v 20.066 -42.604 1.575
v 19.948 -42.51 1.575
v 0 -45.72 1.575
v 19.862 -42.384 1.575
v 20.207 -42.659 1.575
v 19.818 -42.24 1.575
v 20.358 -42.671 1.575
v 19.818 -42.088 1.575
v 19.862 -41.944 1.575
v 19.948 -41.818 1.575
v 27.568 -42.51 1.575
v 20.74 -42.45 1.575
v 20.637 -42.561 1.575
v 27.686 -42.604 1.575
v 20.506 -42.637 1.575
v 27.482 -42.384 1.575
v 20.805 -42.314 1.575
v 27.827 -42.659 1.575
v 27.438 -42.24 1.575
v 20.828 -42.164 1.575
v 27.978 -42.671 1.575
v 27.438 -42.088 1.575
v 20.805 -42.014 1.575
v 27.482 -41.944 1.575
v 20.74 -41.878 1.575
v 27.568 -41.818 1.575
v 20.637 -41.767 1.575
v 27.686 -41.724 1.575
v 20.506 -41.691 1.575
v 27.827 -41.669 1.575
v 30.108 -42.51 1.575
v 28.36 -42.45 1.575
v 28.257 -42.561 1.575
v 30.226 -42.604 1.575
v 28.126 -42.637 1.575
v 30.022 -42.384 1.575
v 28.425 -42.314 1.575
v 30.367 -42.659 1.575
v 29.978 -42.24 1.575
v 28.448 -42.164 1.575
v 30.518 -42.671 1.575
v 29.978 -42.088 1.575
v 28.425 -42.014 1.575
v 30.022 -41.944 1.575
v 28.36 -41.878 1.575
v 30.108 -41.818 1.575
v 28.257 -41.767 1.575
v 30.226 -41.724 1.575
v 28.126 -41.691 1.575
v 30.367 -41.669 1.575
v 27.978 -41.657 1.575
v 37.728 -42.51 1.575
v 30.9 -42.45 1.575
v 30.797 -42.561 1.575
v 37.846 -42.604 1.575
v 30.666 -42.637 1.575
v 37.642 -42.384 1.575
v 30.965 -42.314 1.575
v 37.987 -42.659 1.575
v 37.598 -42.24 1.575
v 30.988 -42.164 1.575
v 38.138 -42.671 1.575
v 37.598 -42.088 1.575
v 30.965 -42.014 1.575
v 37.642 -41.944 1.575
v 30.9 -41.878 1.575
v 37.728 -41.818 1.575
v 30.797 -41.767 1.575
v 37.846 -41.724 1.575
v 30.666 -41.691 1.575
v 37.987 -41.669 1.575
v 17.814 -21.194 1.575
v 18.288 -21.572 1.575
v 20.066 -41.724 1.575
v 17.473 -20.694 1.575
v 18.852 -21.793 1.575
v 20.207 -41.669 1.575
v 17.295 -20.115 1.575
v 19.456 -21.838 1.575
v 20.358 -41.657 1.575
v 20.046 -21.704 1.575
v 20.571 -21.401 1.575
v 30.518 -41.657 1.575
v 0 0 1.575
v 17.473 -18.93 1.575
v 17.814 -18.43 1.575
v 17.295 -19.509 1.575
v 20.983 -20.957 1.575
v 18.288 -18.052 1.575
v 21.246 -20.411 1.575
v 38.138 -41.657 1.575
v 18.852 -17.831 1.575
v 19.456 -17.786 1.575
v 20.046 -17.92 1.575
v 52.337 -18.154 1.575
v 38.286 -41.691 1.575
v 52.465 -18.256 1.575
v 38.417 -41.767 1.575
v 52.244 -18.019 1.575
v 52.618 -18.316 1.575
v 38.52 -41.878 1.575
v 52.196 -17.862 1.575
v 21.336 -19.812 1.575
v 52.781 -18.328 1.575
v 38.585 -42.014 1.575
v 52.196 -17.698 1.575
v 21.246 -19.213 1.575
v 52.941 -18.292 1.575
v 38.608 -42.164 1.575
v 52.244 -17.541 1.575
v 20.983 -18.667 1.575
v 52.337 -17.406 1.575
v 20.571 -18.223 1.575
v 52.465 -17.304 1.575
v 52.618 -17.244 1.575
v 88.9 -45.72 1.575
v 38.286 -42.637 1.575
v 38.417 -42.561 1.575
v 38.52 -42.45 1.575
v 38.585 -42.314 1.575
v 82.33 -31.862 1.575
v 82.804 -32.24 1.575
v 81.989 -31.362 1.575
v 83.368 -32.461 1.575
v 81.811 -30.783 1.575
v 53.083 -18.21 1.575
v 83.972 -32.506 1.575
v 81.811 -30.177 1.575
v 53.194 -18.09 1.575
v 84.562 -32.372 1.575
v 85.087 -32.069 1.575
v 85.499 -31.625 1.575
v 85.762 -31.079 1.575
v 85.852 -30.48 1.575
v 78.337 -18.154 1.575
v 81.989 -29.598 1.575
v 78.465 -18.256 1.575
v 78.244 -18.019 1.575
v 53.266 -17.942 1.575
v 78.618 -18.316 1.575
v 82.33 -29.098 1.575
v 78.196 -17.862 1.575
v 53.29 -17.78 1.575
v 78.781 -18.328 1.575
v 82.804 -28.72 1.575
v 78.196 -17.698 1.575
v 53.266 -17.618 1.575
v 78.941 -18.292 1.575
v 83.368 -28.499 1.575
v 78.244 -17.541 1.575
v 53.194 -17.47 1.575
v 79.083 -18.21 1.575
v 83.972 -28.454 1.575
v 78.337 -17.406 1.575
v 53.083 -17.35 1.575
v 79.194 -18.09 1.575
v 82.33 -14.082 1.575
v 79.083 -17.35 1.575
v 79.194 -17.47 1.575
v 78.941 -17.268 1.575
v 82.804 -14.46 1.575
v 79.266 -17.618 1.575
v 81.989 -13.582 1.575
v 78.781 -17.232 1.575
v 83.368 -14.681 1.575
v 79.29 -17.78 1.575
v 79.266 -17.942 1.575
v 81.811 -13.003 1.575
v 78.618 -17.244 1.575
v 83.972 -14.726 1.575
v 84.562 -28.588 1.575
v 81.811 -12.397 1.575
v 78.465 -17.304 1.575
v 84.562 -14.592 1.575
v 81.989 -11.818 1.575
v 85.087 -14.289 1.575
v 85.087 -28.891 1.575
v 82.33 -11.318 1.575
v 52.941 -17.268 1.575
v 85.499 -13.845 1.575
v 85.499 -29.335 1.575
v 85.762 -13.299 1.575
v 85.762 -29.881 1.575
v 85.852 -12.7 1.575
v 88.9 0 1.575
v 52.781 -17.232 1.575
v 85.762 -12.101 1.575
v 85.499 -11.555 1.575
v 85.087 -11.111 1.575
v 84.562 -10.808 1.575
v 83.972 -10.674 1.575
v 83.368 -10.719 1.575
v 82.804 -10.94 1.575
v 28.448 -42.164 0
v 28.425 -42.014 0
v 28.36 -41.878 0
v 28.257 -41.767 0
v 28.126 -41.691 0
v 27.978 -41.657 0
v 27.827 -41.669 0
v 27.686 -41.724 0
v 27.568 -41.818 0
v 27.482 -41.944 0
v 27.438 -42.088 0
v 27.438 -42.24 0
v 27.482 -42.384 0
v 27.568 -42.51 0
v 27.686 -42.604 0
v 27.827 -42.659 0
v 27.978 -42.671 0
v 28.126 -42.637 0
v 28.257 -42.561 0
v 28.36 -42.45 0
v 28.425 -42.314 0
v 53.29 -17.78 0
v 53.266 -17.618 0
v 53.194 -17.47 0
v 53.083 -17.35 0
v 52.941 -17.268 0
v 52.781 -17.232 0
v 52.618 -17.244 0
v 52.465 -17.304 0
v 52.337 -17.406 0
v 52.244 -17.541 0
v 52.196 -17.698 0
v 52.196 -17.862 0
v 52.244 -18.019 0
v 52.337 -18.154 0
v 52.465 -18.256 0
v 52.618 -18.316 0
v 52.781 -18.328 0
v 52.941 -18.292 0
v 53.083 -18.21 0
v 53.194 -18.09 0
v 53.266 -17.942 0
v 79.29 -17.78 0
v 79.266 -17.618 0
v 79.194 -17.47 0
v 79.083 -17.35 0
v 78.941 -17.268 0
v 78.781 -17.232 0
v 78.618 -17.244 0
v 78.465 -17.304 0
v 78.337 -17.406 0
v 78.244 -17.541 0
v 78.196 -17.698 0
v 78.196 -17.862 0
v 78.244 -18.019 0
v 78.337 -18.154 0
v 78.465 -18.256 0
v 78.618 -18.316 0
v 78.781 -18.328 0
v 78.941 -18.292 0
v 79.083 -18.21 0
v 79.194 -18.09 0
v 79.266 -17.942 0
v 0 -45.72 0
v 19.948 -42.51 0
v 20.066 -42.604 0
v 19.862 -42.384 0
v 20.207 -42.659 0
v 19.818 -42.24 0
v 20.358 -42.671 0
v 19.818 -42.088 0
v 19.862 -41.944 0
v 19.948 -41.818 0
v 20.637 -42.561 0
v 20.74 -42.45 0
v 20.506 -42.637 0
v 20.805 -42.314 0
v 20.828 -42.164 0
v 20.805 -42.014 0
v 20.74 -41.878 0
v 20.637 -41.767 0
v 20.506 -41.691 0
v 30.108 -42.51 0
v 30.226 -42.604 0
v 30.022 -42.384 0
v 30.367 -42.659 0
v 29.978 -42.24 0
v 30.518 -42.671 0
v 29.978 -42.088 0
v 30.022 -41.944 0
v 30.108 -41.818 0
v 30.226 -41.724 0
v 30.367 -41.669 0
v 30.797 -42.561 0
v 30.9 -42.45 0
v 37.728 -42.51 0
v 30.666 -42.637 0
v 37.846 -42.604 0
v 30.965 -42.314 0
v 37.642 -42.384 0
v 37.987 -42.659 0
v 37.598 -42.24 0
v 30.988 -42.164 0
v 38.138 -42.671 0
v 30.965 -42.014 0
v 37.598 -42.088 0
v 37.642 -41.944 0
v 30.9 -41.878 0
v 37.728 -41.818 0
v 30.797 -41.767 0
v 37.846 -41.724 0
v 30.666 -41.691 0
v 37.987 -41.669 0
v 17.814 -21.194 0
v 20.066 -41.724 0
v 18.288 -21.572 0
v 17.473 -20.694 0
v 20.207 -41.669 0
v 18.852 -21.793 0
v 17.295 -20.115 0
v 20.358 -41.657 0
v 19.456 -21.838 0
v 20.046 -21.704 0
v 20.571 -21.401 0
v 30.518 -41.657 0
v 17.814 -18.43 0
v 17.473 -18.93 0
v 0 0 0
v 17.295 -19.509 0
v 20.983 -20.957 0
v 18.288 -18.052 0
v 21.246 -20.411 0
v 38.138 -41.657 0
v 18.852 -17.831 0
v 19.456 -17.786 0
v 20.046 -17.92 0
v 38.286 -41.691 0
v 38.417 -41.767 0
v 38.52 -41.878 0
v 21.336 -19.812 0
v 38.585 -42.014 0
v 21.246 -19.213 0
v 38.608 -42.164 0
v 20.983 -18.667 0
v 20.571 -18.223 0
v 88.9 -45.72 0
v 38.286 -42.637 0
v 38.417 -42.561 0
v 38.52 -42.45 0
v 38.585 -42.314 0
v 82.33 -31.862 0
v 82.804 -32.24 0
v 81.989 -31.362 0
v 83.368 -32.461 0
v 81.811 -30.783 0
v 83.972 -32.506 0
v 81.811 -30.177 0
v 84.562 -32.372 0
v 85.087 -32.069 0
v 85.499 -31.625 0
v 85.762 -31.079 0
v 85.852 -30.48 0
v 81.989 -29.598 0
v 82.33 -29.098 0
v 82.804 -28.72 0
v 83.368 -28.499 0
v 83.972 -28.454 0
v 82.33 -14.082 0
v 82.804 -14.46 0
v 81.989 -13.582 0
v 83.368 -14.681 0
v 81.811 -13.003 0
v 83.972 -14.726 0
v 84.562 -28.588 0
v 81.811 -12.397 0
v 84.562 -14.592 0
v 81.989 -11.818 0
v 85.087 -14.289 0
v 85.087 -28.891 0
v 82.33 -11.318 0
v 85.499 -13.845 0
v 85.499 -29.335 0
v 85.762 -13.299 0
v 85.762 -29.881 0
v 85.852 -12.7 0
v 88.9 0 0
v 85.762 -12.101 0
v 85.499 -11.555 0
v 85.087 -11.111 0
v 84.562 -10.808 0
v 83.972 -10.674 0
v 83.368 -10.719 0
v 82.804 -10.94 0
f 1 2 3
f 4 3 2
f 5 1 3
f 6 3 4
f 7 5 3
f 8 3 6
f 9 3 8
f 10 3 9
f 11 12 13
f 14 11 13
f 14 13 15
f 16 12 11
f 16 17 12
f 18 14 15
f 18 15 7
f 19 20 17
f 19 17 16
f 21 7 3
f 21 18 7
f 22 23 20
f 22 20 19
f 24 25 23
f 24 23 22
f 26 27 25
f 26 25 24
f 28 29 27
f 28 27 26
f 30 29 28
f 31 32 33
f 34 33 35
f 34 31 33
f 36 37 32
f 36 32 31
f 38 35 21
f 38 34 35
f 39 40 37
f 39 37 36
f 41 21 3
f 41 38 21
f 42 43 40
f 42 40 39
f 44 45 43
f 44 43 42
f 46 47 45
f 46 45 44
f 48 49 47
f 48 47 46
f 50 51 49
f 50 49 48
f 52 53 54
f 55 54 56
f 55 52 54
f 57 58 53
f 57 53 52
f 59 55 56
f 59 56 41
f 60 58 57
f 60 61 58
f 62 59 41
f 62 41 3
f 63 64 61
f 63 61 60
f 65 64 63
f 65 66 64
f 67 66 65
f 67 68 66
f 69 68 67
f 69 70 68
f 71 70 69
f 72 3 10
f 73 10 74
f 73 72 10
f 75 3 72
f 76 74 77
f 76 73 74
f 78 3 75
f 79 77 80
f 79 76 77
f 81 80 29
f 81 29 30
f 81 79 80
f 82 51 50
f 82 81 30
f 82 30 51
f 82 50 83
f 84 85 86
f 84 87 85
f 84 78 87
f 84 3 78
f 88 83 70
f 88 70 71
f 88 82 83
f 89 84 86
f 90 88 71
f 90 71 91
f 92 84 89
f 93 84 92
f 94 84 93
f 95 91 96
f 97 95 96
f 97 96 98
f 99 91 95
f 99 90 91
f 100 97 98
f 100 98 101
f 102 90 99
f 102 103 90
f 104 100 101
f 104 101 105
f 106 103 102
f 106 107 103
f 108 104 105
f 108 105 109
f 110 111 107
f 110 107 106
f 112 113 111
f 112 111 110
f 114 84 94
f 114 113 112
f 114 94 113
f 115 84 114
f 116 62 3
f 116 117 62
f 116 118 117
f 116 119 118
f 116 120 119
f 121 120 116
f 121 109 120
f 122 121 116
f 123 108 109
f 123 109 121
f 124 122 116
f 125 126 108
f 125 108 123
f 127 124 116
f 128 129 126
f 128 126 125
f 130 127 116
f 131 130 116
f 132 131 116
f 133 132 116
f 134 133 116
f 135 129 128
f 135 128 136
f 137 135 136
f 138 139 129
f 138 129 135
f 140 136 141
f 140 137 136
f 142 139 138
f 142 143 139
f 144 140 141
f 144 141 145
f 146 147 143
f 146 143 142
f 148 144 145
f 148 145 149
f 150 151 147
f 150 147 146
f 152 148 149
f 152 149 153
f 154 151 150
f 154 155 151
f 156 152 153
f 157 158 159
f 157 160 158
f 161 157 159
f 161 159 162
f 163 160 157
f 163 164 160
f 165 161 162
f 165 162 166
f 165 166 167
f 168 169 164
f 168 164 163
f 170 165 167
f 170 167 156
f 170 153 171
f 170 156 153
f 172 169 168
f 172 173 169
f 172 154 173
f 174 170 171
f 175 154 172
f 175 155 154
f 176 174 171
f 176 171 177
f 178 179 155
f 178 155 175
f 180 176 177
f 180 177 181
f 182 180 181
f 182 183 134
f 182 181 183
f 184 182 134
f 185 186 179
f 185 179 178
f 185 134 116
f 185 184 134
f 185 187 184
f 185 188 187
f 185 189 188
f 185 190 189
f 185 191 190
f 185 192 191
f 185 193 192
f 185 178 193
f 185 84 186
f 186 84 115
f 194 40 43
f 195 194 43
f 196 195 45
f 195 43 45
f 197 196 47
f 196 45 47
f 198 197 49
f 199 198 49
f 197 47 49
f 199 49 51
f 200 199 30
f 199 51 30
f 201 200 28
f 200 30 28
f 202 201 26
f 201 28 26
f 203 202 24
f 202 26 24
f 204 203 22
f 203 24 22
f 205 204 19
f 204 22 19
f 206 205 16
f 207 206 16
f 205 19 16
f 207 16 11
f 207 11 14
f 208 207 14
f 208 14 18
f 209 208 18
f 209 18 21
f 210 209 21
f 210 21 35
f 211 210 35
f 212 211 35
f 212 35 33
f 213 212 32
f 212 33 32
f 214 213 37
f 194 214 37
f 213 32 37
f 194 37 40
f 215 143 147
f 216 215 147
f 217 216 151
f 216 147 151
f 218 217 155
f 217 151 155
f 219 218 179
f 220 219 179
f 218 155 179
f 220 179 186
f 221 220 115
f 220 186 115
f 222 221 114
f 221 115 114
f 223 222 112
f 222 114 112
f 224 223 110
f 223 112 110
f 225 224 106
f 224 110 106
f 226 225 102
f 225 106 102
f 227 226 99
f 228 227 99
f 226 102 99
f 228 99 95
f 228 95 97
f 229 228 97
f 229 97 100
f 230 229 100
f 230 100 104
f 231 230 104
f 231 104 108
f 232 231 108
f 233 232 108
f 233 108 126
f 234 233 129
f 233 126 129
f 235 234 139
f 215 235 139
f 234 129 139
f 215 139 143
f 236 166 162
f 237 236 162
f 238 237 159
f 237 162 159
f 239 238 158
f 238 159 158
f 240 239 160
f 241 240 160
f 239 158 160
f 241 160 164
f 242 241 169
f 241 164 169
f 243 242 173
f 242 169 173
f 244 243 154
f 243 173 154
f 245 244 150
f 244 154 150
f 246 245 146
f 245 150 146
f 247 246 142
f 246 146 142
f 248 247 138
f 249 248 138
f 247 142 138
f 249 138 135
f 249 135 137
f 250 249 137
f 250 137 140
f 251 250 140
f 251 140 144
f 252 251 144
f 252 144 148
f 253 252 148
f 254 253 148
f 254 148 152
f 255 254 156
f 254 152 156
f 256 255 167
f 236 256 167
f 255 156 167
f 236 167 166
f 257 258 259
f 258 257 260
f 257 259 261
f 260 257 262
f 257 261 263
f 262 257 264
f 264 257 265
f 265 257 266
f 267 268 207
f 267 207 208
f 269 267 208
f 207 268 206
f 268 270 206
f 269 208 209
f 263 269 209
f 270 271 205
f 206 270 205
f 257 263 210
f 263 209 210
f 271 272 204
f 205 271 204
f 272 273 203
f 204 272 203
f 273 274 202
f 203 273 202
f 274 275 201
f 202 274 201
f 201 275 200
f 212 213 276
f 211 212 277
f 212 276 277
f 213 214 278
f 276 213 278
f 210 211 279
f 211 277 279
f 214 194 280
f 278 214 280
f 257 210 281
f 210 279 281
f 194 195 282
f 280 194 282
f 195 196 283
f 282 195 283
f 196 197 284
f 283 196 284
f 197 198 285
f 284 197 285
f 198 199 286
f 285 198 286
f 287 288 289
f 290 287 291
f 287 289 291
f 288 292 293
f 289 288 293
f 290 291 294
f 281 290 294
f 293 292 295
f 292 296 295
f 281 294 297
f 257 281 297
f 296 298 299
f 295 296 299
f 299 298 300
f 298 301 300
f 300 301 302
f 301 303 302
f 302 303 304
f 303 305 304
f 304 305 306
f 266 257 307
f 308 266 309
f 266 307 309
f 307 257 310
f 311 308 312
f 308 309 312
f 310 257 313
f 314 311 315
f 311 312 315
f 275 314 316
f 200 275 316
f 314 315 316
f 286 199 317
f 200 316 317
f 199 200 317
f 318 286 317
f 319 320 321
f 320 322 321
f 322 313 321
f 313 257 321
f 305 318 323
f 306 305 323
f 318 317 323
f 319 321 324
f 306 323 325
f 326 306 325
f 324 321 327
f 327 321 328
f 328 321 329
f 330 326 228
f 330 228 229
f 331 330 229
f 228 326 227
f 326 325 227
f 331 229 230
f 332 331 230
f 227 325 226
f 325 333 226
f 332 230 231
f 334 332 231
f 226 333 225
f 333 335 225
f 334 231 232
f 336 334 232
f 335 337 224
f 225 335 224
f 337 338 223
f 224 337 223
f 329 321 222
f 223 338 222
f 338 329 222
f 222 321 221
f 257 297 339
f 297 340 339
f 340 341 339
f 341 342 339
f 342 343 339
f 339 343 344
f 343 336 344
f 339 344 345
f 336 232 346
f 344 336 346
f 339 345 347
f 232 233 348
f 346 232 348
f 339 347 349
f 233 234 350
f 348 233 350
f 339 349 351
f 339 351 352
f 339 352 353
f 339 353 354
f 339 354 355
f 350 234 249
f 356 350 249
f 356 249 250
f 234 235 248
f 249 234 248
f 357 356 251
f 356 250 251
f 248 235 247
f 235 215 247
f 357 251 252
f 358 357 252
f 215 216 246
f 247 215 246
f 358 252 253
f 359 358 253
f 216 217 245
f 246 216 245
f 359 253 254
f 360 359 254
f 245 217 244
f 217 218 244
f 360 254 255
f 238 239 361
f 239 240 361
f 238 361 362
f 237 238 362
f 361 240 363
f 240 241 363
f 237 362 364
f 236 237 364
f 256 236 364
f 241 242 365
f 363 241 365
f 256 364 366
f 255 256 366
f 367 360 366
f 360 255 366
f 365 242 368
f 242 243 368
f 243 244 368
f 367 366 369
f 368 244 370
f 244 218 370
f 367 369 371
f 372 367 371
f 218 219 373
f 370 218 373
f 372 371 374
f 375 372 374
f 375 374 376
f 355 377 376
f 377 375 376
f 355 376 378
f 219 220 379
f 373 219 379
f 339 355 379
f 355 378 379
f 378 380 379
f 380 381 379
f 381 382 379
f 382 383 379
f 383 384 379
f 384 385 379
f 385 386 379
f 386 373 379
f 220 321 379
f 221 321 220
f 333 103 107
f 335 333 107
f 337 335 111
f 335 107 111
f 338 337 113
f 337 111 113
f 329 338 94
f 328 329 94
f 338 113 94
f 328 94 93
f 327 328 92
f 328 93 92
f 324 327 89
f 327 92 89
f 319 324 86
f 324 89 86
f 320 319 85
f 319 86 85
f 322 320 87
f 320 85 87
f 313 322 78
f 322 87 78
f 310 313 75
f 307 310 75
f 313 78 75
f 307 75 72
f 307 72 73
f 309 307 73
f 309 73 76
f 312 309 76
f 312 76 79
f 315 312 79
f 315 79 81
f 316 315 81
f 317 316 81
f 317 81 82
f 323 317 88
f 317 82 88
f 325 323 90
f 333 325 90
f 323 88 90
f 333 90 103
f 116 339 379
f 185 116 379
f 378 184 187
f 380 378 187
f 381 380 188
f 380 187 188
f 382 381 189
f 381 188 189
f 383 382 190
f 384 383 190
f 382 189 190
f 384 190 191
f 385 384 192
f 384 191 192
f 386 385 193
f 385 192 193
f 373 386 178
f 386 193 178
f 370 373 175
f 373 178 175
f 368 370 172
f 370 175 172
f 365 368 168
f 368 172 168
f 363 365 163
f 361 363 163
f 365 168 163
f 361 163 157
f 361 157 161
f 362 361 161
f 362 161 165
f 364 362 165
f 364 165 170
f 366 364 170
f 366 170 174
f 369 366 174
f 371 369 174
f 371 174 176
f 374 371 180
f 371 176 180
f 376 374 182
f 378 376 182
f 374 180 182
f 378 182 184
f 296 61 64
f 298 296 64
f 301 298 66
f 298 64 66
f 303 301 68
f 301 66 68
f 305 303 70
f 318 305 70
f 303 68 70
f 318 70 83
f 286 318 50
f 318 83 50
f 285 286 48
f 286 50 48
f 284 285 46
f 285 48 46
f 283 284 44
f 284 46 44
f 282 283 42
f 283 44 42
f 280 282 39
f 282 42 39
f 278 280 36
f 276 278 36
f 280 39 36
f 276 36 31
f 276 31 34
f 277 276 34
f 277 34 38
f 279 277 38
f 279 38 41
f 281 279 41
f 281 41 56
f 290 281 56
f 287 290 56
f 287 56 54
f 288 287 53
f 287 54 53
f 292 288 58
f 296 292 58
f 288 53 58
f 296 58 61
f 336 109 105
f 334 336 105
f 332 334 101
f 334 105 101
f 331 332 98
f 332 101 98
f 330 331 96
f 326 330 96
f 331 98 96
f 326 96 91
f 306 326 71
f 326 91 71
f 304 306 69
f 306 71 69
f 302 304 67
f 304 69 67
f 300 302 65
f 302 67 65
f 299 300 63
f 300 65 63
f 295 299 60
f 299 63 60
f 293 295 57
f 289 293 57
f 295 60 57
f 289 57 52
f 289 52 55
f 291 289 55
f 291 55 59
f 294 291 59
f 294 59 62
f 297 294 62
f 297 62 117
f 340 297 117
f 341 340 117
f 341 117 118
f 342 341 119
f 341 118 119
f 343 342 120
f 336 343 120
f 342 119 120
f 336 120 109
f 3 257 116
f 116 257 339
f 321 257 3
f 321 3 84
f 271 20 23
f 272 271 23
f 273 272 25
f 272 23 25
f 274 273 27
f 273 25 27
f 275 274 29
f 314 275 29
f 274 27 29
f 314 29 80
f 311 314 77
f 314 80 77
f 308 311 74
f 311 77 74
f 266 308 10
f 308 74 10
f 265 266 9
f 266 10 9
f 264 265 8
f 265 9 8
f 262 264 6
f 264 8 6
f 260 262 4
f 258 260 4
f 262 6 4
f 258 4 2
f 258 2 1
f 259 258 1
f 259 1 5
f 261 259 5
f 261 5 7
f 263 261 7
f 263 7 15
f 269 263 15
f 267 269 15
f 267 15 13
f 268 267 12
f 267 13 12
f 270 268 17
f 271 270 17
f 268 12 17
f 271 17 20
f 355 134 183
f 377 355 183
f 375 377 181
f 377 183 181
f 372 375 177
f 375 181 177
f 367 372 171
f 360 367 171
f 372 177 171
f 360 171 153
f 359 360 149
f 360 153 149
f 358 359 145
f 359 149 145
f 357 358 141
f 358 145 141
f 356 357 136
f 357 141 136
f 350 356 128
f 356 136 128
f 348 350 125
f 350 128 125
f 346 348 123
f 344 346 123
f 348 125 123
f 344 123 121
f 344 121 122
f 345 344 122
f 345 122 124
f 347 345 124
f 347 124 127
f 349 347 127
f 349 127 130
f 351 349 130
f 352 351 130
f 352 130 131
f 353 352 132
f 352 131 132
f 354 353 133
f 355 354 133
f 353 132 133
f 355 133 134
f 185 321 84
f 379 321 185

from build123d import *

# Parameters (mm, degrees)
SKETCH1_W                 = 88.9
SKETCH1_H                 = 45.72
BOARD_SHAPE_EXTRUDE_DEPTH = 1.5748
SKETCH2_R                 = 0.55
MMC_MOUNT_HOLE_CUT_DEPTH  = 1.5748
SKETCH4_R                 = 0.508
HFBR_ANCHOR_HOLES_DEPTH   = 1.5748
SKETCH5_R                 = 2.032
CUT_EXTRUDE3_DEPTH        = 1.5748


with BuildPart() as part:
    # Sketch1 → board shape -extrude (new body)
    with BuildSketch(Plane.XY):
        with Locations((44.45, -22.86)):
            Rectangle(SKETCH1_W, SKETCH1_H)
    extrude(amount=BOARD_SHAPE_EXTRUDE_DEPTH)

    # Sketch2 → mmc mount hole - cut (cut)
    with BuildSketch(Plane.XY.offset(1.5748)):
        with Locations((52.74, -17.78)):
            Circle(SKETCH2_R)
        with Locations((78.74, -17.78)):
            Circle(SKETCH2_R)
    extrude(amount=-MMC_MOUNT_HOLE_CUT_DEPTH, mode=Mode.SUBTRACT)

    # Sketch4 → HFBR anchor holes (cut)
    with BuildSketch(Plane.XY.offset(1.5748)):
        with Locations((20.32, -42.164)):
            Circle(SKETCH4_R)
        with Locations((27.94, -42.164)):
            Circle(SKETCH4_R)
        with Locations((30.48, -42.164)):
            Circle(SKETCH4_R)
        with Locations((38.1, -42.164)):
            Circle(SKETCH4_R)
    extrude(amount=-HFBR_ANCHOR_HOLES_DEPTH, mode=Mode.SUBTRACT)

    # Sketch5 → Cut-Extrude3 (cut)
    with BuildSketch(Plane.XY.offset(1.5748)):
        with Locations((83.82, -30.48)):
            Circle(SKETCH5_R)
        with Locations((83.82, -12.7)):
            Circle(SKETCH5_R)
        with Locations((19.304, -19.812)):
            Circle(SKETCH5_R)
    extrude(amount=-CUT_EXTRUDE3_DEPTH, mode=Mode.SUBTRACT)


solid = part.part
